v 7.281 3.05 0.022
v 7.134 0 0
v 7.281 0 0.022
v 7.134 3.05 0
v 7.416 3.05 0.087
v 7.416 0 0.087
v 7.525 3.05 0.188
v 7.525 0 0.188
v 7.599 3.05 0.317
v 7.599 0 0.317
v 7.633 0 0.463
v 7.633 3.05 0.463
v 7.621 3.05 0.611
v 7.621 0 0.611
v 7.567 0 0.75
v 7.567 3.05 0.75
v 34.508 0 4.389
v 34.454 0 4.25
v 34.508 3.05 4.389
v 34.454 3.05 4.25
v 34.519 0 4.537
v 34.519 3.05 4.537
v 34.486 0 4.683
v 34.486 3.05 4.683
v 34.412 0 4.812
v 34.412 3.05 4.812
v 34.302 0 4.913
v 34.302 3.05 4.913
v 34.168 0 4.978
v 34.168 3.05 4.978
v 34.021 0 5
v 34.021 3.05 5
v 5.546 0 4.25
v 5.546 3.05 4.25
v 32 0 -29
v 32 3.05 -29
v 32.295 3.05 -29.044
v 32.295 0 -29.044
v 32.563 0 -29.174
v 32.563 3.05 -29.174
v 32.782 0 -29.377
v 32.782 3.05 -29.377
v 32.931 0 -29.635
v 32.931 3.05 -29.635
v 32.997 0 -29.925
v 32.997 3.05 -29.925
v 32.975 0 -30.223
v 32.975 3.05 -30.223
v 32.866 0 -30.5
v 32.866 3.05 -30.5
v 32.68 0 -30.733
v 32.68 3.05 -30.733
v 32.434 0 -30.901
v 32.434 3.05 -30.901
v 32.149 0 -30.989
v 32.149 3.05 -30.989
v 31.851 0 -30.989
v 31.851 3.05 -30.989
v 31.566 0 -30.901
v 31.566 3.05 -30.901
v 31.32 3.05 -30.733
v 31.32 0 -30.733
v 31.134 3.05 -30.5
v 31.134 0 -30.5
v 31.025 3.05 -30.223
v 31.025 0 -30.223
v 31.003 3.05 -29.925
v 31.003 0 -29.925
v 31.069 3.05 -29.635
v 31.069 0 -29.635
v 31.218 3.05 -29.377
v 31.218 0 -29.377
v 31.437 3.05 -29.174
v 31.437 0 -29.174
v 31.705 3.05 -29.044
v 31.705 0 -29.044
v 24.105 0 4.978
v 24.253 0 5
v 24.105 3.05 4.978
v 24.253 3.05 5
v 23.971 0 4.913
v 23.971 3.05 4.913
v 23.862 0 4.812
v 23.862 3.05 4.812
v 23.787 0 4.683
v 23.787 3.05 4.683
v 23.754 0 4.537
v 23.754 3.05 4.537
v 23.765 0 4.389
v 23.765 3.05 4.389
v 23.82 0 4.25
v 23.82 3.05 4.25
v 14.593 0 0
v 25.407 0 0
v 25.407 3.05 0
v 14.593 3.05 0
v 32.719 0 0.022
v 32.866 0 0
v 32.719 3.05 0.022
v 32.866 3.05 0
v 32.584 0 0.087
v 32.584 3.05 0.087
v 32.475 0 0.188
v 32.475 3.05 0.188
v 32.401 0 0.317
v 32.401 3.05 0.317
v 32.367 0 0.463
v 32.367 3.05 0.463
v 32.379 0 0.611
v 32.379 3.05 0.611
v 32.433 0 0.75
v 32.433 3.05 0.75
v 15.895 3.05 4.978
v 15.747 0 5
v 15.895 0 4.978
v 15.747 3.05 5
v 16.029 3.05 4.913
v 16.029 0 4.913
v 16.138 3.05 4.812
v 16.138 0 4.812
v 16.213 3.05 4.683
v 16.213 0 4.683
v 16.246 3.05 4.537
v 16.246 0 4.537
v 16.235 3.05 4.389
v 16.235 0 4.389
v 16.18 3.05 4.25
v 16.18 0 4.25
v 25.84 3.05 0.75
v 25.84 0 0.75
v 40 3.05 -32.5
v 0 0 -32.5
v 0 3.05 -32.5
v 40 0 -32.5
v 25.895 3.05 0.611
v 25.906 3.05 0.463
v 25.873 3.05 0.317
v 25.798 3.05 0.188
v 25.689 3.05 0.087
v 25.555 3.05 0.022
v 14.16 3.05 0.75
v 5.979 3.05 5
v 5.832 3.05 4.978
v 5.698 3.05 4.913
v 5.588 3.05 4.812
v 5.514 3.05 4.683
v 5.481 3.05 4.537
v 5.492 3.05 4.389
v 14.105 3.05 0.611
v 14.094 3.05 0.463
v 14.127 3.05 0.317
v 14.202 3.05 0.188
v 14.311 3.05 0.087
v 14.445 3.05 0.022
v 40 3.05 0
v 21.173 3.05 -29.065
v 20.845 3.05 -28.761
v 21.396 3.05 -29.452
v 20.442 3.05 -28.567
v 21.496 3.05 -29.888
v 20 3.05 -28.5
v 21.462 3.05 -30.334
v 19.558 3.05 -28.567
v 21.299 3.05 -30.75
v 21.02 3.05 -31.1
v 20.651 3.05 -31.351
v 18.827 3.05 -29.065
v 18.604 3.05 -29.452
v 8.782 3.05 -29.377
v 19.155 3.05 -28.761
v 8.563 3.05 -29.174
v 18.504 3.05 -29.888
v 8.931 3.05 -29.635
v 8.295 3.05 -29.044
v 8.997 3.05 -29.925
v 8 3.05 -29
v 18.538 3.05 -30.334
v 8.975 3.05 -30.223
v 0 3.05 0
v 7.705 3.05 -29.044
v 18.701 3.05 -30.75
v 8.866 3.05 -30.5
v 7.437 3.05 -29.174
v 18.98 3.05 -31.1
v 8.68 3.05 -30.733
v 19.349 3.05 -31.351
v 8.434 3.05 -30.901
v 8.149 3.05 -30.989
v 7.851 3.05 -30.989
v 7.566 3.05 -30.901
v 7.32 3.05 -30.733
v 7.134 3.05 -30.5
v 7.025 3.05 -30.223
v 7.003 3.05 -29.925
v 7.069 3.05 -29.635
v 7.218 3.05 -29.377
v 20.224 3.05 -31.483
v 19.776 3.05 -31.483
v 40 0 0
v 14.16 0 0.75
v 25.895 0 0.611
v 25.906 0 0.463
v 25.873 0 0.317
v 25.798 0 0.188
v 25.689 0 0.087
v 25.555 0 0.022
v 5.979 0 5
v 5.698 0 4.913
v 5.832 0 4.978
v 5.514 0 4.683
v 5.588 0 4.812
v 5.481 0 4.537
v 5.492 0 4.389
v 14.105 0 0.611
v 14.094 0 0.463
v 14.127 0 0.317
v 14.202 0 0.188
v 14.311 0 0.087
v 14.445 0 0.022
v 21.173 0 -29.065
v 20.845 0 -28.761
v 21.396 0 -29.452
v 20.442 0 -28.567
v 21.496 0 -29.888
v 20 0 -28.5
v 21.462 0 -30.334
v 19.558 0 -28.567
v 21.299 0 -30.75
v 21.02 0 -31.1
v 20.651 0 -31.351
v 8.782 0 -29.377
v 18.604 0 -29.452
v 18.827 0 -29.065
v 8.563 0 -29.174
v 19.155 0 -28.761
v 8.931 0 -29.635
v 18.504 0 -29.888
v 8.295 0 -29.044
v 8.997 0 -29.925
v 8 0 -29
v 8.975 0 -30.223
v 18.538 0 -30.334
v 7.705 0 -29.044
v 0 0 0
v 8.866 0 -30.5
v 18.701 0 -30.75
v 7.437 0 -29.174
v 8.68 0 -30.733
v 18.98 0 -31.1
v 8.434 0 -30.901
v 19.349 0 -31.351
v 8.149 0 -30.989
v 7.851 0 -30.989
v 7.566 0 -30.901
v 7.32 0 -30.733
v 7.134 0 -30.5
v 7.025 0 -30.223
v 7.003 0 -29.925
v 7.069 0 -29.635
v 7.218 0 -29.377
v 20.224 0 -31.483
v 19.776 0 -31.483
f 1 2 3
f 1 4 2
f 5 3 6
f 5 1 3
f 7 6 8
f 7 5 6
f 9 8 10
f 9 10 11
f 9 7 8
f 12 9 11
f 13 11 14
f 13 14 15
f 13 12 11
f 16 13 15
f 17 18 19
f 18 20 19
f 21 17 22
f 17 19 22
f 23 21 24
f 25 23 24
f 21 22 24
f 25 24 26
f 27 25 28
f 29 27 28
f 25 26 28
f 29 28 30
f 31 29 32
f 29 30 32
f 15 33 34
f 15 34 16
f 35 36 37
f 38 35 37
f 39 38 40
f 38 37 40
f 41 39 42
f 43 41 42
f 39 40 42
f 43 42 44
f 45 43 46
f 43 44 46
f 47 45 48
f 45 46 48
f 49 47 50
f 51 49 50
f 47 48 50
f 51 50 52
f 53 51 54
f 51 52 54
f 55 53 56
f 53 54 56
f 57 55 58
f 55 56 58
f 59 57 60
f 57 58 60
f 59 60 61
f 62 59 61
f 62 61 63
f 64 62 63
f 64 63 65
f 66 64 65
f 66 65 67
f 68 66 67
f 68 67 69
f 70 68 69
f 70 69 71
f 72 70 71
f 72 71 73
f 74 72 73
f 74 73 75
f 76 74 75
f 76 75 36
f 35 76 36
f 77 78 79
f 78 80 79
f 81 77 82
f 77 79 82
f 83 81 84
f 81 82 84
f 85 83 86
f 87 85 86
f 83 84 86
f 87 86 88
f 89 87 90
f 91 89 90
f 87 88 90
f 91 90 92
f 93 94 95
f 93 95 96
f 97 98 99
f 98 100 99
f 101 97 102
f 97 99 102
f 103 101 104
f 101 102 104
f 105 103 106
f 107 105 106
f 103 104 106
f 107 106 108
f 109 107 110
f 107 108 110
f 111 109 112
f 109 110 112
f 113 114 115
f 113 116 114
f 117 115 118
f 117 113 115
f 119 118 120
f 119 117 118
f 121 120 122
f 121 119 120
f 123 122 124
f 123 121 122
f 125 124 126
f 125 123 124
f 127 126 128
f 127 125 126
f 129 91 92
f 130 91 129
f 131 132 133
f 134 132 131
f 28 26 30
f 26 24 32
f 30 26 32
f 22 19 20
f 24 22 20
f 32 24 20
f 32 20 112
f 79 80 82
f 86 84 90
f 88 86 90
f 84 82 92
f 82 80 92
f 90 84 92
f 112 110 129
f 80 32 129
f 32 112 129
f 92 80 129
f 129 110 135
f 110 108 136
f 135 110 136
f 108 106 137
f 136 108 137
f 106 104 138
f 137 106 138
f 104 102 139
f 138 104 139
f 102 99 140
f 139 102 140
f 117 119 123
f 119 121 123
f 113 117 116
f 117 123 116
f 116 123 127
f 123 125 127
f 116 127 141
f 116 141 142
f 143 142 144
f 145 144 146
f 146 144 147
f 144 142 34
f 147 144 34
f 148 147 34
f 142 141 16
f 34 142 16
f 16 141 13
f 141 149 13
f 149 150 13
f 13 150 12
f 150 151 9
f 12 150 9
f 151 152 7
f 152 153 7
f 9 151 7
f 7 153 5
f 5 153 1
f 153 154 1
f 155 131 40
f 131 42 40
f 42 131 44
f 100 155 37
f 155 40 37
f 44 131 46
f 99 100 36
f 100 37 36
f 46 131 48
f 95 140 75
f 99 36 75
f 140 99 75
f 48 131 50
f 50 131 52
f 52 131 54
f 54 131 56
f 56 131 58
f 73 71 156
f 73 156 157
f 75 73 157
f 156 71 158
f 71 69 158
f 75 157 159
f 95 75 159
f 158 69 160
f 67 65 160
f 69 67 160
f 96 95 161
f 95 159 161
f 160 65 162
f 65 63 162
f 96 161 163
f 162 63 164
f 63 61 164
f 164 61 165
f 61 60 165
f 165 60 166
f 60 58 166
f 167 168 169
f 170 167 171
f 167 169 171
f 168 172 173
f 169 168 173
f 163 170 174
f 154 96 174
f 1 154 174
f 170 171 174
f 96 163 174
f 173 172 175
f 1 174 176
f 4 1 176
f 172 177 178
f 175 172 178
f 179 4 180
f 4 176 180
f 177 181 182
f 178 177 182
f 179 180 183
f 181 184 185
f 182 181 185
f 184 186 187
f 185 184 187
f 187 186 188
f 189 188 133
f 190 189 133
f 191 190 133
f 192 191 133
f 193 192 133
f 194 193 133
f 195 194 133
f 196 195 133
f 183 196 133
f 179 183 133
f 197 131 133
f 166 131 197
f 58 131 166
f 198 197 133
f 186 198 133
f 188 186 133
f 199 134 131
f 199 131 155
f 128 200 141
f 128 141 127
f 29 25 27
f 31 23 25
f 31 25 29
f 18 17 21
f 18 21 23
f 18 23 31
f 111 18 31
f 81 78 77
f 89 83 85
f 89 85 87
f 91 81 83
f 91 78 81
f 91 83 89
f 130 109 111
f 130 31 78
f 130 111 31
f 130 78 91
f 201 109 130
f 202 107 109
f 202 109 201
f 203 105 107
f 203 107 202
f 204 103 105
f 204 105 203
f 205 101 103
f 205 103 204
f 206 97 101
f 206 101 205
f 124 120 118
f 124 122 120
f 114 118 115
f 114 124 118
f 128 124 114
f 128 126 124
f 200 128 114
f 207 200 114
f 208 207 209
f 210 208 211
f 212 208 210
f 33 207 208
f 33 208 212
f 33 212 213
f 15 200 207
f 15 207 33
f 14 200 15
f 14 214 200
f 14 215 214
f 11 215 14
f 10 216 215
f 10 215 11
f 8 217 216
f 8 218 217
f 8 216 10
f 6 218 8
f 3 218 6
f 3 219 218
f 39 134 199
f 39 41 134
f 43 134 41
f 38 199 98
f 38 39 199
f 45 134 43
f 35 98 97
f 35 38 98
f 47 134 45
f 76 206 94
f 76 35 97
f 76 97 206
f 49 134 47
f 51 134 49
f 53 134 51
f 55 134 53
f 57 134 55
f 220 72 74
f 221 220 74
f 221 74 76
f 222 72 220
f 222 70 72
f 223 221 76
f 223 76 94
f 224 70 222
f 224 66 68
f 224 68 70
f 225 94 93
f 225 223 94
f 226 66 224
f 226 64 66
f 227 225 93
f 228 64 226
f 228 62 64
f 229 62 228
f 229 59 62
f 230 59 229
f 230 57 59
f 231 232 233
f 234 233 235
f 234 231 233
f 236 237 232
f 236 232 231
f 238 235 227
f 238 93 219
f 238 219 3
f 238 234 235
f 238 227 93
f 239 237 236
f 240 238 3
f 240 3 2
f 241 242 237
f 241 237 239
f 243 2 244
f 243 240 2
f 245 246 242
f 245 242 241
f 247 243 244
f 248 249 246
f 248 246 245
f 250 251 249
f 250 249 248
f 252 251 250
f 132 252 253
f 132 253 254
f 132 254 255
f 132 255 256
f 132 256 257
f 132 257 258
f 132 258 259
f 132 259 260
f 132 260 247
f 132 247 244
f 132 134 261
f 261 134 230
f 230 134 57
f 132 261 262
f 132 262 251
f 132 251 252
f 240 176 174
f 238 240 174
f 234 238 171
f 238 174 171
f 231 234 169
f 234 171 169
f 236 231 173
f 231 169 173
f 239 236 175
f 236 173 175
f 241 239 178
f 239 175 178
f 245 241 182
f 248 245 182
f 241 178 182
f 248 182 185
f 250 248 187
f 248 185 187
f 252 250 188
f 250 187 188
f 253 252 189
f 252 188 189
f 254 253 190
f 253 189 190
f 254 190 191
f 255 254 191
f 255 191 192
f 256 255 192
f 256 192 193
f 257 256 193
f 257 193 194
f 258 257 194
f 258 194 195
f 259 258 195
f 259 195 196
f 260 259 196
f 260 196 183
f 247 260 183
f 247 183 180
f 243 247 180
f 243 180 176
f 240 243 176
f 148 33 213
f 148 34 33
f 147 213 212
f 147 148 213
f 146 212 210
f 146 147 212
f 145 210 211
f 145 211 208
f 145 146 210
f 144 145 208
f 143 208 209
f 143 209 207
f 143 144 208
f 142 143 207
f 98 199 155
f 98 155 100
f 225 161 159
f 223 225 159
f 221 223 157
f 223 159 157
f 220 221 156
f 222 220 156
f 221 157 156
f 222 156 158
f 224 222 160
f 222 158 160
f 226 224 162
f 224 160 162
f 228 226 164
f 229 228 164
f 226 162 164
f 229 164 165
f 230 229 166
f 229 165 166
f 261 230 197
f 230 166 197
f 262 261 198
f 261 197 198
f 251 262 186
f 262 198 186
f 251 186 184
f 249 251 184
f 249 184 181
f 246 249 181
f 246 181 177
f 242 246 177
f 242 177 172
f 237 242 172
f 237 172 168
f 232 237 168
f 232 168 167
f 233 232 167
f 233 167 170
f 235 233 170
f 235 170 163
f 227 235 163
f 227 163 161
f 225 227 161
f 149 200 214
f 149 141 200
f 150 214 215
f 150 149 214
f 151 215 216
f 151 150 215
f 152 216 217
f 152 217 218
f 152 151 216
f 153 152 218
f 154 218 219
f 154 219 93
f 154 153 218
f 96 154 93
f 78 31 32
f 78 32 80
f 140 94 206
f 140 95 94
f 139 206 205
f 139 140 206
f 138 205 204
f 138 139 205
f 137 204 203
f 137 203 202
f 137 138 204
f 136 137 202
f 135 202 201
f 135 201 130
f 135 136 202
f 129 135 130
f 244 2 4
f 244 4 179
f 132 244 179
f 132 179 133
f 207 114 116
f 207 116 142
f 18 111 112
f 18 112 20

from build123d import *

# Parameters (mm, degrees)
BOSS_EXTRUDE1_DEPTH = 3.05
SKETCH2_R           = 1
SKETCH2_R_2         = 1.5
CUT_EXTRUDE1_DEPTH  = 10
FILLET1_R           = 0.5


with BuildPart() as part:
    # Sketch1 → Boss-Extrude1 (new body)
    with BuildSketch(Plane(origin=(0, 0, 0), x_dir=(1, 0, 0), z_dir=(0, 1, 0))):
        Polygon((0, 0), (0, 32.5), (40, 32.5), (40, 0), (32, 0), (34.886751346, -5), (23.386751346, -5), (26.273502692, 0), (13.726497308, 0), (16.613248654, -5), (5.113248654, -5), (8, 0), align=None)
    extrude(amount=BOSS_EXTRUDE1_DEPTH)

    # Sketch2 → Cut-Extrude1 (cut)
    with BuildSketch(Plane(origin=(0, 3.05, 0), x_dir=(1, 0, 0), z_dir=(0, 1, 0))):
        with Locations(Location((8, 30, 0), (0, 0, 270))):
            Circle(SKETCH2_R)
        with Locations(Location((32, 30, 0), (0, 0, 270))):
            Circle(SKETCH2_R)
        with Locations(Location((20, 30, 0), (0, 0, 270))):
            Circle(SKETCH2_R_2)
    extrude(amount=-CUT_EXTRUDE1_DEPTH, mode=Mode.SUBTRACT)

    # Fillet1
    fillet1_edges = [part.edges().sort_by_distance(p)[0] for p in [
        (32, 1.525, 0),
        (34.886751346, 1.525, 5),
        (23.386751346, 1.525, 5),
        (26.273502692, 1.525, 0),
        (13.726497308, 1.525, 0),
        (16.613248654, 1.525, 5),
        (5.113248654, 1.525, 5),
        (8, 1.525, 0),
    ]]
    fillet(fillet1_edges, radius=FILLET1_R)


solid = part.part
